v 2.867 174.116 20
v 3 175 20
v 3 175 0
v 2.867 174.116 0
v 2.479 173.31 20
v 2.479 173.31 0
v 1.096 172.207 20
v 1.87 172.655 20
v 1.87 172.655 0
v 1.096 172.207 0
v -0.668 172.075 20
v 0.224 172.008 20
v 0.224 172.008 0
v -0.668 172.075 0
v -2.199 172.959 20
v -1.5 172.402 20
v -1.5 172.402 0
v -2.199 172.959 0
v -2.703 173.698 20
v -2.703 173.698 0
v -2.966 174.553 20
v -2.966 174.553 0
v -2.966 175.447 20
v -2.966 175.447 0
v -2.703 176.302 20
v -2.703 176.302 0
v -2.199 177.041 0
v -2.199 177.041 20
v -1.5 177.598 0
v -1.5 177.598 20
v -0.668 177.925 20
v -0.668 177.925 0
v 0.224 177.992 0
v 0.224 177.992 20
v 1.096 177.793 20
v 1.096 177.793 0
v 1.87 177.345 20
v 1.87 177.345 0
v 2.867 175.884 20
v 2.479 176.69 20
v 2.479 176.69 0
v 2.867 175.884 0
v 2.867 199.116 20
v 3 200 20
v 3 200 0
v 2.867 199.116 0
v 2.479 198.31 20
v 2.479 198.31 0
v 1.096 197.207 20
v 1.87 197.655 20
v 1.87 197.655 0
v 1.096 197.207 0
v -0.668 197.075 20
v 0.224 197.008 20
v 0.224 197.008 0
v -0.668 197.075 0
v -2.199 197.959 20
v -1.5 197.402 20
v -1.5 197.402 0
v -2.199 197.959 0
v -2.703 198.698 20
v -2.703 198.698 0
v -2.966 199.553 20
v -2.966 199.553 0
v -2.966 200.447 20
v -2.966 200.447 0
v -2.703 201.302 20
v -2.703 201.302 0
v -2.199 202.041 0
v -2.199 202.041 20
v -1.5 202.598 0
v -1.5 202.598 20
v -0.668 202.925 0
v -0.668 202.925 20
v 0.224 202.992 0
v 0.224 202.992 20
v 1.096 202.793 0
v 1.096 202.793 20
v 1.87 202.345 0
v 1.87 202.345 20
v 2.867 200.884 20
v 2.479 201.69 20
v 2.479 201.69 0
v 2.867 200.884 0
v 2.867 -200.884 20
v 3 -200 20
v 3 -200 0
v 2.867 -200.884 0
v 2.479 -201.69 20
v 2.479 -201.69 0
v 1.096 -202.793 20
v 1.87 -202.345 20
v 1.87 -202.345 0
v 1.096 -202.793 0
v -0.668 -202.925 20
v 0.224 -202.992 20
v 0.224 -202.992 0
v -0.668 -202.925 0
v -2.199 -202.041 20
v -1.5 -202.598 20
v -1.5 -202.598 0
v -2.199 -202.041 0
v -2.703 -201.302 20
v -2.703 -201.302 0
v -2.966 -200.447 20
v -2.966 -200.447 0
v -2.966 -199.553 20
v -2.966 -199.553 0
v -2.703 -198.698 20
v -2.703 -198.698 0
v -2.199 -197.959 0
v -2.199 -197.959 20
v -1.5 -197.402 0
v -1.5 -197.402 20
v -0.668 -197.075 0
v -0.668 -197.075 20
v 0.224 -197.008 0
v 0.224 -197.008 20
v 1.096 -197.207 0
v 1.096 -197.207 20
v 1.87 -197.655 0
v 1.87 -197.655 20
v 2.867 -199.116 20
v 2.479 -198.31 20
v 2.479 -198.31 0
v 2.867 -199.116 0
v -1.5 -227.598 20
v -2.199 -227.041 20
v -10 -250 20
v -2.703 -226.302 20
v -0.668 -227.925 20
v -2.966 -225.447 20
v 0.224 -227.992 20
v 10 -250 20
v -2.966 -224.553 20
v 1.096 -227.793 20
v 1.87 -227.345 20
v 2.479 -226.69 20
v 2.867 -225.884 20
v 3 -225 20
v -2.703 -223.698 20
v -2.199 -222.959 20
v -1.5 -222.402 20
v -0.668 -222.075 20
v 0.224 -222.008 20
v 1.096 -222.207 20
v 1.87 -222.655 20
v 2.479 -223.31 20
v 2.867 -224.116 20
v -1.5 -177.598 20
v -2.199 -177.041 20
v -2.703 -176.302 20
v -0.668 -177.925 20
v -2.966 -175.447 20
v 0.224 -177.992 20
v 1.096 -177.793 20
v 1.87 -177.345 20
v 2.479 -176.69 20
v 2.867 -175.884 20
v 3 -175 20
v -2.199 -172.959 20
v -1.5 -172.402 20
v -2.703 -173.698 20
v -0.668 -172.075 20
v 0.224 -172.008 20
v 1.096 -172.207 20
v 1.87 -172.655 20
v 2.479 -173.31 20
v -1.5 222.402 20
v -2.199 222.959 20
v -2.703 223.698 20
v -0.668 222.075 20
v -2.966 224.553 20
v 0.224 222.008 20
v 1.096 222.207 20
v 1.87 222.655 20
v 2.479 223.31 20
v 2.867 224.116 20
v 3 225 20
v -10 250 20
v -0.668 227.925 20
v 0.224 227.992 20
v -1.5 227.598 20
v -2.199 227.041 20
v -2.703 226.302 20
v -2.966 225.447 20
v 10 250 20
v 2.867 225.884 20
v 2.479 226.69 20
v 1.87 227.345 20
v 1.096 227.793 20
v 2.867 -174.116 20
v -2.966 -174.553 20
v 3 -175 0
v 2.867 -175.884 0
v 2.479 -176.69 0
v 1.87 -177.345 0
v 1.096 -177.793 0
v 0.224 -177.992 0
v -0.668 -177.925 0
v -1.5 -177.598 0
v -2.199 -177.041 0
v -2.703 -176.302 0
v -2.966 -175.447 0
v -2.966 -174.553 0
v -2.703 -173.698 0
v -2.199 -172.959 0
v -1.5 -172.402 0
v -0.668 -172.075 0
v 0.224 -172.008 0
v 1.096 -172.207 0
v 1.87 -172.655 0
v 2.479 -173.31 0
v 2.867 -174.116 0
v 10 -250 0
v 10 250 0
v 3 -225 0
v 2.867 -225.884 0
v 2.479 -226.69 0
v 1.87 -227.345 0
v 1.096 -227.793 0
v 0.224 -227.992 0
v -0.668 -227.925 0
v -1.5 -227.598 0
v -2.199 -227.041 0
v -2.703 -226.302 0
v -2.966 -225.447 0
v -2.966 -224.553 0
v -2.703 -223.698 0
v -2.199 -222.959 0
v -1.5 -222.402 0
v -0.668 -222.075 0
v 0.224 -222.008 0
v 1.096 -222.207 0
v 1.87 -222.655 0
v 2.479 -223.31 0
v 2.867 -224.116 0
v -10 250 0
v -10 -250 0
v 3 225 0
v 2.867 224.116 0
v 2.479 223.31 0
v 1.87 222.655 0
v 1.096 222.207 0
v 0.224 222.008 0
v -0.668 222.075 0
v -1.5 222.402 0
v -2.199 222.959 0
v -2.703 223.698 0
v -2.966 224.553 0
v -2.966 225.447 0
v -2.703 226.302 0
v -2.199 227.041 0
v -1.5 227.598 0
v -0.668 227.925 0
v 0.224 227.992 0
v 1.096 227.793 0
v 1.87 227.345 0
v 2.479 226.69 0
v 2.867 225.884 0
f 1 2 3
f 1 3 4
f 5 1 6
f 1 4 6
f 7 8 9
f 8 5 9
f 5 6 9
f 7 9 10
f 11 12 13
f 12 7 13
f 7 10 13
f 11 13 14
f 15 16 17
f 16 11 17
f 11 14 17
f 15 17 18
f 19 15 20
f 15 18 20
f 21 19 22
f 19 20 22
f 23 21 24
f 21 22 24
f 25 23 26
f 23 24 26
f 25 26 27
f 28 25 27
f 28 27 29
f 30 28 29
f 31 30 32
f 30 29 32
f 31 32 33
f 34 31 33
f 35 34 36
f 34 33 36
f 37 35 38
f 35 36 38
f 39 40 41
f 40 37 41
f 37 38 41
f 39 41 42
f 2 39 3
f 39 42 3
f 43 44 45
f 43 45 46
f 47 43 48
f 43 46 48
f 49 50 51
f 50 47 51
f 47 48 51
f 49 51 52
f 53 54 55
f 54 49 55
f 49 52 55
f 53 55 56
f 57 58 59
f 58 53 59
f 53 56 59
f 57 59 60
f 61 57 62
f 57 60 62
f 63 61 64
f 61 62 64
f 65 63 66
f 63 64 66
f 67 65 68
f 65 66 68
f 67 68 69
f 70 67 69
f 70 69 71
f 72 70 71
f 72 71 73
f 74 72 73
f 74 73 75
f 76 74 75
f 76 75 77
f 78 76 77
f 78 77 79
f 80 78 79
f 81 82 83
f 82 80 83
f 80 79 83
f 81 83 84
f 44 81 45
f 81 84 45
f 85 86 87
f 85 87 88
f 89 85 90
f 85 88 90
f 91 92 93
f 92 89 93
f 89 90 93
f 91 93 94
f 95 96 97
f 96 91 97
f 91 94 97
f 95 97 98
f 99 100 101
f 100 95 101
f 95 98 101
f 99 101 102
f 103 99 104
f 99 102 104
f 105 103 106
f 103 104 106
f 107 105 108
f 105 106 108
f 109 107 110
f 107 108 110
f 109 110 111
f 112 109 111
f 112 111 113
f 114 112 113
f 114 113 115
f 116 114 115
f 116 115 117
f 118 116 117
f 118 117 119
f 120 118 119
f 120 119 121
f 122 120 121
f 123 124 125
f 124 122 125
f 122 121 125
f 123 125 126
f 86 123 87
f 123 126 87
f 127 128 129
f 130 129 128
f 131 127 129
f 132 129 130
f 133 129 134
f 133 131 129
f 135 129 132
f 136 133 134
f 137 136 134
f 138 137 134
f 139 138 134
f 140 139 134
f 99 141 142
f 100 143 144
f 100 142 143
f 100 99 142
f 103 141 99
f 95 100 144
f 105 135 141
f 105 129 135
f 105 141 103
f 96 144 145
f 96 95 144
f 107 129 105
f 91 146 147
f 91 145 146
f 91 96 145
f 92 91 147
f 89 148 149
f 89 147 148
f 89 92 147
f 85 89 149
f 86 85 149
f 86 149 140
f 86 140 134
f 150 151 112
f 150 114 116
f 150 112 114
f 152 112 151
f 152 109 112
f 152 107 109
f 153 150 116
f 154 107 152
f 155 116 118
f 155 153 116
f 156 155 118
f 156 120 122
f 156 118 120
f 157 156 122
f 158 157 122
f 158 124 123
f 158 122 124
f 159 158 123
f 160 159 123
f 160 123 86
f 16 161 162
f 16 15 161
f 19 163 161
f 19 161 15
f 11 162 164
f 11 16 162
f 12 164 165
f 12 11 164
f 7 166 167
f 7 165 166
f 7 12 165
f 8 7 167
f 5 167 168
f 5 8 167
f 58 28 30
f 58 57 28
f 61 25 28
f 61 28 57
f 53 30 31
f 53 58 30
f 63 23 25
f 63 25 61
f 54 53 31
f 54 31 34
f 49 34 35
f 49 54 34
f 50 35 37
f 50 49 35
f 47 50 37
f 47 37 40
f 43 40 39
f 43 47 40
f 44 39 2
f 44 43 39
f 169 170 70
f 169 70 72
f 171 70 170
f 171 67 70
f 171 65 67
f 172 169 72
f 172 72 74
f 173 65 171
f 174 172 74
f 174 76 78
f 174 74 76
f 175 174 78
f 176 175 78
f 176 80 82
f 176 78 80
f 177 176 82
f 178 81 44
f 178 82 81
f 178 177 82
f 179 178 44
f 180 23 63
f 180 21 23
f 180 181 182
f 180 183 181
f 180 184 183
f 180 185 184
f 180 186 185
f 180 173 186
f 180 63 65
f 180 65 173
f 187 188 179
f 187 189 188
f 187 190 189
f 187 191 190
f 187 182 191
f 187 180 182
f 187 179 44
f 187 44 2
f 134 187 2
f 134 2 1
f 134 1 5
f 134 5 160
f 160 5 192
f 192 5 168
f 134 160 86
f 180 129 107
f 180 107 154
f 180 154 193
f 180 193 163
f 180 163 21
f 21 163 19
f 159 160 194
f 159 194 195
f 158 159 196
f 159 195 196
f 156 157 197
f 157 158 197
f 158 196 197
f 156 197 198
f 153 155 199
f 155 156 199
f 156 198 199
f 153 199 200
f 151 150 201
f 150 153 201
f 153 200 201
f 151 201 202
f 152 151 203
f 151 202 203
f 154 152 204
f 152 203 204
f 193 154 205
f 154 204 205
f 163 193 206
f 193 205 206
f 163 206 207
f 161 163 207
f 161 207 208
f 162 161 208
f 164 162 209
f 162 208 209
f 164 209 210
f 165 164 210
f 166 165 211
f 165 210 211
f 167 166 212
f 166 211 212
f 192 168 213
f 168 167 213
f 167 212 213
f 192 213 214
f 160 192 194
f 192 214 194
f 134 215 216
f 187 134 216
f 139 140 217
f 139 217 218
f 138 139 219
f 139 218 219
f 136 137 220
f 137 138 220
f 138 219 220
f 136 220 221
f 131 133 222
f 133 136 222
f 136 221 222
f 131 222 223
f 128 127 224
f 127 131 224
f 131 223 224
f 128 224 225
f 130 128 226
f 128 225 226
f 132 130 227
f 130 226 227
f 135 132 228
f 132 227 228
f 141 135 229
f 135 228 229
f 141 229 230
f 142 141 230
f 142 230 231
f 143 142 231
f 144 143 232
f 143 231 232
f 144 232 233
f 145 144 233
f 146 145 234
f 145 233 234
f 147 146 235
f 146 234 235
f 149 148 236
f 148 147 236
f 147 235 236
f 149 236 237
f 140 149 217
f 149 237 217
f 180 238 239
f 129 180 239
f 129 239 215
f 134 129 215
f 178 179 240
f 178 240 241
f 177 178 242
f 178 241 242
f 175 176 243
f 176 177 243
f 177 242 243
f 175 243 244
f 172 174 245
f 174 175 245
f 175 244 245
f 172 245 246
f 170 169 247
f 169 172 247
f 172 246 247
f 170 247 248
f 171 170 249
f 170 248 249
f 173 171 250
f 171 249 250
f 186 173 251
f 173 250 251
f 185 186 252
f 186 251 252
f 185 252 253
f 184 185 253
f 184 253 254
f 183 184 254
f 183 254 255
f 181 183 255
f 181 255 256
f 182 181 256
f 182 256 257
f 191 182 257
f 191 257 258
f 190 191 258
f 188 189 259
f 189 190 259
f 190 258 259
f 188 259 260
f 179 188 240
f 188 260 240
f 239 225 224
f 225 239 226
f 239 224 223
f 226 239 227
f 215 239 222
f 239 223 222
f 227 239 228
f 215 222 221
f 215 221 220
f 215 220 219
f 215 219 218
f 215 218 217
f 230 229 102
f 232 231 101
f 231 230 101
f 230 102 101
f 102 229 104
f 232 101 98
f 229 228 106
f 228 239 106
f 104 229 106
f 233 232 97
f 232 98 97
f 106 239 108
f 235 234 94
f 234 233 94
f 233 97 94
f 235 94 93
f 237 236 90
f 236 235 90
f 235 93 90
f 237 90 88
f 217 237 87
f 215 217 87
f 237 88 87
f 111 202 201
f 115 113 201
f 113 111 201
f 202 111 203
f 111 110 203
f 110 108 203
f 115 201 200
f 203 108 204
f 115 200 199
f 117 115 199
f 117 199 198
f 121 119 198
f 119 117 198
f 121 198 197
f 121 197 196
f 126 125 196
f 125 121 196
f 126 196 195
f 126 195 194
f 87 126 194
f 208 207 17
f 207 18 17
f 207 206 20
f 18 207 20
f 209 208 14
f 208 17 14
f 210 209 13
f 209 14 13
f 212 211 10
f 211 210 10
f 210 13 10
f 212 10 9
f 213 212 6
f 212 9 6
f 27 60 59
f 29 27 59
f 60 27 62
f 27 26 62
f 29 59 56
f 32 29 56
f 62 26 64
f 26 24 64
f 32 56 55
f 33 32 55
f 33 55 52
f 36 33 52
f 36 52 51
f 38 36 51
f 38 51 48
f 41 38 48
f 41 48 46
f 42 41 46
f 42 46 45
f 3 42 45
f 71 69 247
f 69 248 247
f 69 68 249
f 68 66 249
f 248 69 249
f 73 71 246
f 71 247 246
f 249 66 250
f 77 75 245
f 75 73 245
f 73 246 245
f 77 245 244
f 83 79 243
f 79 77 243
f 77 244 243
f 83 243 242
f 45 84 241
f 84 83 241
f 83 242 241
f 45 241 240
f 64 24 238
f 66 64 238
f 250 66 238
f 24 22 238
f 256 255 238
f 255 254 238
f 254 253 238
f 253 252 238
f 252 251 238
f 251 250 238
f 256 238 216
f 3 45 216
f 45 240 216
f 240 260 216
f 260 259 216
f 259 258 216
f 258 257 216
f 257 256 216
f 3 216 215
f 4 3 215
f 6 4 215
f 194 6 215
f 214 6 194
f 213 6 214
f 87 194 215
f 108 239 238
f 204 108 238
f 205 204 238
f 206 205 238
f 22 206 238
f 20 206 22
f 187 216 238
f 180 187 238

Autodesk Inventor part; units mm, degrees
ref_plane "YZ Plane" through (0, 0, 0) normal (1, 0, 0) x (0, 1, 0)
ref_plane "XZ Plane" through (0, 0, 0) normal (0, 1, 0) x (-1, 0, 0)
ref_plane "XY Plane" through (0, 0, 0) normal (0, 0, 1) x (1, 0, 0)
sketch "草圖1" plane through (0, 0, 0) normal (0, 0, 1) x (1, 0, 0)
  line L0 (-10, -250) -> (10, -250)
  line L1 (10, -250) -> (10, 250)
  line L2 (10, 250) -> (-10, 250)
  line L3 (-10, 250) -> (-10, -250)
  line L4 (-10, -250) -> (10, 250) construction
  line L5 (10, -250) -> (-10, 250) construction
  circle A0 centre (0, 225) radius 3
  circle A1 centre (0, 200) radius 3
  circle A2 centre (0, -200) radius 3
  circle A3 centre (0, -225) radius 3
  circle A4 centre (0, -175) radius 3
  circle A5 centre (0, 175) radius 3
  point P0 (0, 0)
  dimension "d0" = 20
  dimension "d1" = 500
  dimension "d6" = 6
  dimension "d7" = 6
  dimension "d10" = 6
  dimension "d11" = 6
  dimension "d15" = 6
  dimension "d17" = 6
extrude "擠出1" add sketch "草圖1" along normal blind 20 contours L3 L2 L1 L0 | A0 | A1 | A2 | A3 | A4 | A5
extrude "擠出2" cut sketch "草圖1" along normal blind 20 contours A0 | A1 | A2 | A3 | A4 | A5
properties part number "DOF11"
